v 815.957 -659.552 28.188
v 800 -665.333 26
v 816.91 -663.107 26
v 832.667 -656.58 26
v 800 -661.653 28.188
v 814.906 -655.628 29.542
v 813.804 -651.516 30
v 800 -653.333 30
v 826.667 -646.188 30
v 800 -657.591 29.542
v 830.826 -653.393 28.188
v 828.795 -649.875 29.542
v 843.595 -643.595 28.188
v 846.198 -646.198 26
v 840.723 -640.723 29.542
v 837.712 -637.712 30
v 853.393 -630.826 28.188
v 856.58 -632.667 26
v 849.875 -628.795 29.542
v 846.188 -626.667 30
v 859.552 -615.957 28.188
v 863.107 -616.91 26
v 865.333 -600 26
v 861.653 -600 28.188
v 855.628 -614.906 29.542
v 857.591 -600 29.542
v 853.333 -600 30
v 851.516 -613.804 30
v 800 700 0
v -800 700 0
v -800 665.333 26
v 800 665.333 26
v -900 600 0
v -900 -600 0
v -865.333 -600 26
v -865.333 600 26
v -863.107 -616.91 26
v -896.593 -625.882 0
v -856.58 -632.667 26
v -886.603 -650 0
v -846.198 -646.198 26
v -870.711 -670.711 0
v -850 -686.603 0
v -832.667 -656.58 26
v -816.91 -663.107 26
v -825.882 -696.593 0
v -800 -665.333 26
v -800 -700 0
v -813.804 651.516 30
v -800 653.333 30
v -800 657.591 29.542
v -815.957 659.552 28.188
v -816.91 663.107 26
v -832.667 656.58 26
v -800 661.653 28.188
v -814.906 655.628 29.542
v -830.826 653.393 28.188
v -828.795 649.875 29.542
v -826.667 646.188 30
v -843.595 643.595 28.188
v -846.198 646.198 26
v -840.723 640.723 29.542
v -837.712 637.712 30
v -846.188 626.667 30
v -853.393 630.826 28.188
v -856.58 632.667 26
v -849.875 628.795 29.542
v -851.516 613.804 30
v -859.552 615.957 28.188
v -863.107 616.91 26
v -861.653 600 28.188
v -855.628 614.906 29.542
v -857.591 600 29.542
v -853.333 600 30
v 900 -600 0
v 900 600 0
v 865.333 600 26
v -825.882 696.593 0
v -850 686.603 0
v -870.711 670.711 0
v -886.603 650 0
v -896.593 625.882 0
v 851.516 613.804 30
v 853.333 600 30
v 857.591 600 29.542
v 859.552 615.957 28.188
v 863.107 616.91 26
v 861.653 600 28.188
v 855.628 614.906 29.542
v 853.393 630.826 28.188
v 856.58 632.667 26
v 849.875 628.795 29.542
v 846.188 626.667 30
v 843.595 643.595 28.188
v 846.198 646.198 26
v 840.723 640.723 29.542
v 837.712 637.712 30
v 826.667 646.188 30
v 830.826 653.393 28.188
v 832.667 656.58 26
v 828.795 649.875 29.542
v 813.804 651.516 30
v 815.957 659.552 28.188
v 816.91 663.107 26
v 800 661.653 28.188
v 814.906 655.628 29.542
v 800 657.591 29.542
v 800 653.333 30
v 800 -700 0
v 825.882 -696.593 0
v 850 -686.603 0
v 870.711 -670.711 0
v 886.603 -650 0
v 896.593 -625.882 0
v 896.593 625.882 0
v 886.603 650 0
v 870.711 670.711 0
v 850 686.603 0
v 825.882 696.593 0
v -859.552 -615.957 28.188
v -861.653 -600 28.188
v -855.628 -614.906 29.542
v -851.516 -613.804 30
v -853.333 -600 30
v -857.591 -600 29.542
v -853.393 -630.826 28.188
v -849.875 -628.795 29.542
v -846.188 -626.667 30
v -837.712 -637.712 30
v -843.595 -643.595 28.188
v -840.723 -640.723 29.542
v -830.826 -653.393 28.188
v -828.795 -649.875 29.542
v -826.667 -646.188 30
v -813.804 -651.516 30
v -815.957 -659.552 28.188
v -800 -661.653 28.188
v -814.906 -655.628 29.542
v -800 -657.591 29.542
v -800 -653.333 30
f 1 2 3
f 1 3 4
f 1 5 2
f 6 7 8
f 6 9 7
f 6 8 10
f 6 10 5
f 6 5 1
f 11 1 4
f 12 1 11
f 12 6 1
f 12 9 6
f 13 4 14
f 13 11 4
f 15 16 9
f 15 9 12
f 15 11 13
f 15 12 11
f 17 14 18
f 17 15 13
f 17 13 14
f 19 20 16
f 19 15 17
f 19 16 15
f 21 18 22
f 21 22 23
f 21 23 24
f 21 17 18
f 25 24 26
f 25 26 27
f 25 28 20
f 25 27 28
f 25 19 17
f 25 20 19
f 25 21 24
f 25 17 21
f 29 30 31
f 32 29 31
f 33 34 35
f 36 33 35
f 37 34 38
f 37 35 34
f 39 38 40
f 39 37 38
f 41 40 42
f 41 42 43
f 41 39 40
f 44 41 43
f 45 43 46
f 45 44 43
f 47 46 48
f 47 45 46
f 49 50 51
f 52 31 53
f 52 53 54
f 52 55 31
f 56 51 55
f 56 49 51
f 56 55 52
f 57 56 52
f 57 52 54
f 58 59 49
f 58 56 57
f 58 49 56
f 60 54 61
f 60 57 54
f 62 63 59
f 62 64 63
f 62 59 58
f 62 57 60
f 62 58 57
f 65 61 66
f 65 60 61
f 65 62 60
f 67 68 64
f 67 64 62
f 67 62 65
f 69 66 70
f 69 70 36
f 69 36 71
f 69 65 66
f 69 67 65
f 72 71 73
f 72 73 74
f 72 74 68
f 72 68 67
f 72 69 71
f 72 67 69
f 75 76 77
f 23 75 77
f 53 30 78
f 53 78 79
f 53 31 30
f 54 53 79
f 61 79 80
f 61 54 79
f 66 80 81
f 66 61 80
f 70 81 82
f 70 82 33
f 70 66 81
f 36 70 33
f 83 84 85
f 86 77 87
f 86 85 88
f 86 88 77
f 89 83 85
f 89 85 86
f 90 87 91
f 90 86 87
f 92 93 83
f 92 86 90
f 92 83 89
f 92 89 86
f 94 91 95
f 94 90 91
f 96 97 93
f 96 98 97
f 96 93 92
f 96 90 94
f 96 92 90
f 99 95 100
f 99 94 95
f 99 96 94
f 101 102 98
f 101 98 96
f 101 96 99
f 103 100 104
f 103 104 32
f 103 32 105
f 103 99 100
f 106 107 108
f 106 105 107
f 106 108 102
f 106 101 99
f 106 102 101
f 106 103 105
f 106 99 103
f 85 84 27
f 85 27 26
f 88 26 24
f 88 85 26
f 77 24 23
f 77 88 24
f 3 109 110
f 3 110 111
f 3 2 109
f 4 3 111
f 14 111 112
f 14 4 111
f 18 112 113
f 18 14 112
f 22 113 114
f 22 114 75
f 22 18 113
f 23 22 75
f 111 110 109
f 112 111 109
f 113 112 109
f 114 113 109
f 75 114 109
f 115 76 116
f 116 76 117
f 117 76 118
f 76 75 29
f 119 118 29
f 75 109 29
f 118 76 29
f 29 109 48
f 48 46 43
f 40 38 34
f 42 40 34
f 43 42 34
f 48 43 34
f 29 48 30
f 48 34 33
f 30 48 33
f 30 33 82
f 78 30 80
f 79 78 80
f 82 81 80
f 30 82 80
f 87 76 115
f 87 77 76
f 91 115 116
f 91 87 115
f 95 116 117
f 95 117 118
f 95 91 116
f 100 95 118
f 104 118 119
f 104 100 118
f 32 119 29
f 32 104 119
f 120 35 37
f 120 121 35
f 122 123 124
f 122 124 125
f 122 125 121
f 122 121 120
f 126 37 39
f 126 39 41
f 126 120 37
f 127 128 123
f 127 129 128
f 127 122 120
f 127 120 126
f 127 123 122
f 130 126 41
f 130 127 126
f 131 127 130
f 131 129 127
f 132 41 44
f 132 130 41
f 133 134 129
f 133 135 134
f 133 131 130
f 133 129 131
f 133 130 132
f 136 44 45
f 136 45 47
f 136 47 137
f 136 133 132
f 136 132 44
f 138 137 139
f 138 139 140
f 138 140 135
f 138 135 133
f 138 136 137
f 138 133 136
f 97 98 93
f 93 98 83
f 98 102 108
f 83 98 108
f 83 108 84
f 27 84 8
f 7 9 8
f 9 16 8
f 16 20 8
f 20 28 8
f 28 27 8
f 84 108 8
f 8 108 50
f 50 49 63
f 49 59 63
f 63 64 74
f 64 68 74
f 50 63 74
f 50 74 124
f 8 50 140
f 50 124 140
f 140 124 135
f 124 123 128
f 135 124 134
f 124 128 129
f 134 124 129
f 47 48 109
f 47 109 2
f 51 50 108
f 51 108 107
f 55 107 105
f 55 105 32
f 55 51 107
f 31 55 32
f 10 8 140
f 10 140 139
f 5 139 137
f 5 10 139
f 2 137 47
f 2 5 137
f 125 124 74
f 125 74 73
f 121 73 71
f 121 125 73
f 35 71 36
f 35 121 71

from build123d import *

# Parameters (mm, degrees)
F0_W     = 1700
F0_H     = 1300
F1_DEPTH = 30
F2_R     = 50


with BuildPart() as f1:
    # F0 (on Top) → F1 (new body)
    with BuildSketch(Plane.XY):
        Rectangle(F0_W, F0_H)
    extrude(amount=F1_DEPTH)

    # F2
    f2_edges = [f1.edges().sort_by_distance(p)[0] for p in [
        (-850, -650, 15),
        (-850, 650, 15),
        (850, -650, 15),
        (850, 650, 15),
    ]]
    fillet(f2_edges, radius=F2_R)

    # F6: sweep along a path in F5
    with BuildLine(Plane.XY.offset(30)) as f6_path:
        Line((800, 650), (-800, 650))
        ThreePointArc((-800, 650), (-835.3553390593, 635.3553390593), (-850, 600))
        Line((-850, 600), (-850, -600))
        ThreePointArc((-850, -600), (-835.3553390593, -635.3553390593), (-800, -650))
        Line((-800, -650), (800, -650))
        ThreePointArc((800, -650), (835.3553390593, -635.3553390593), (850, -600))
        Line((850, -600), (850, 600))
        ThreePointArc((850, 600), (835.3553390593, 635.3553390593), (800, 650))
    # F4 (on offset) → F6 (sweep)
    with BuildSketch(Plane.XZ.offset(600)):
        with BuildLine():
            Line((853.3333333333, 30), (850, 30))
            Line((850, 30), (850, 0))
            Line((850, 0), (900, 0))
            Line((900, 0), (865.3333333333, 26))
            ThreePointArc((865.3333333333, 26), (859.6578886537, 28.973665961), (853.3333333333, 30))
        make_face()
    sweep(path=f6_path.line)


solid = f1.part
